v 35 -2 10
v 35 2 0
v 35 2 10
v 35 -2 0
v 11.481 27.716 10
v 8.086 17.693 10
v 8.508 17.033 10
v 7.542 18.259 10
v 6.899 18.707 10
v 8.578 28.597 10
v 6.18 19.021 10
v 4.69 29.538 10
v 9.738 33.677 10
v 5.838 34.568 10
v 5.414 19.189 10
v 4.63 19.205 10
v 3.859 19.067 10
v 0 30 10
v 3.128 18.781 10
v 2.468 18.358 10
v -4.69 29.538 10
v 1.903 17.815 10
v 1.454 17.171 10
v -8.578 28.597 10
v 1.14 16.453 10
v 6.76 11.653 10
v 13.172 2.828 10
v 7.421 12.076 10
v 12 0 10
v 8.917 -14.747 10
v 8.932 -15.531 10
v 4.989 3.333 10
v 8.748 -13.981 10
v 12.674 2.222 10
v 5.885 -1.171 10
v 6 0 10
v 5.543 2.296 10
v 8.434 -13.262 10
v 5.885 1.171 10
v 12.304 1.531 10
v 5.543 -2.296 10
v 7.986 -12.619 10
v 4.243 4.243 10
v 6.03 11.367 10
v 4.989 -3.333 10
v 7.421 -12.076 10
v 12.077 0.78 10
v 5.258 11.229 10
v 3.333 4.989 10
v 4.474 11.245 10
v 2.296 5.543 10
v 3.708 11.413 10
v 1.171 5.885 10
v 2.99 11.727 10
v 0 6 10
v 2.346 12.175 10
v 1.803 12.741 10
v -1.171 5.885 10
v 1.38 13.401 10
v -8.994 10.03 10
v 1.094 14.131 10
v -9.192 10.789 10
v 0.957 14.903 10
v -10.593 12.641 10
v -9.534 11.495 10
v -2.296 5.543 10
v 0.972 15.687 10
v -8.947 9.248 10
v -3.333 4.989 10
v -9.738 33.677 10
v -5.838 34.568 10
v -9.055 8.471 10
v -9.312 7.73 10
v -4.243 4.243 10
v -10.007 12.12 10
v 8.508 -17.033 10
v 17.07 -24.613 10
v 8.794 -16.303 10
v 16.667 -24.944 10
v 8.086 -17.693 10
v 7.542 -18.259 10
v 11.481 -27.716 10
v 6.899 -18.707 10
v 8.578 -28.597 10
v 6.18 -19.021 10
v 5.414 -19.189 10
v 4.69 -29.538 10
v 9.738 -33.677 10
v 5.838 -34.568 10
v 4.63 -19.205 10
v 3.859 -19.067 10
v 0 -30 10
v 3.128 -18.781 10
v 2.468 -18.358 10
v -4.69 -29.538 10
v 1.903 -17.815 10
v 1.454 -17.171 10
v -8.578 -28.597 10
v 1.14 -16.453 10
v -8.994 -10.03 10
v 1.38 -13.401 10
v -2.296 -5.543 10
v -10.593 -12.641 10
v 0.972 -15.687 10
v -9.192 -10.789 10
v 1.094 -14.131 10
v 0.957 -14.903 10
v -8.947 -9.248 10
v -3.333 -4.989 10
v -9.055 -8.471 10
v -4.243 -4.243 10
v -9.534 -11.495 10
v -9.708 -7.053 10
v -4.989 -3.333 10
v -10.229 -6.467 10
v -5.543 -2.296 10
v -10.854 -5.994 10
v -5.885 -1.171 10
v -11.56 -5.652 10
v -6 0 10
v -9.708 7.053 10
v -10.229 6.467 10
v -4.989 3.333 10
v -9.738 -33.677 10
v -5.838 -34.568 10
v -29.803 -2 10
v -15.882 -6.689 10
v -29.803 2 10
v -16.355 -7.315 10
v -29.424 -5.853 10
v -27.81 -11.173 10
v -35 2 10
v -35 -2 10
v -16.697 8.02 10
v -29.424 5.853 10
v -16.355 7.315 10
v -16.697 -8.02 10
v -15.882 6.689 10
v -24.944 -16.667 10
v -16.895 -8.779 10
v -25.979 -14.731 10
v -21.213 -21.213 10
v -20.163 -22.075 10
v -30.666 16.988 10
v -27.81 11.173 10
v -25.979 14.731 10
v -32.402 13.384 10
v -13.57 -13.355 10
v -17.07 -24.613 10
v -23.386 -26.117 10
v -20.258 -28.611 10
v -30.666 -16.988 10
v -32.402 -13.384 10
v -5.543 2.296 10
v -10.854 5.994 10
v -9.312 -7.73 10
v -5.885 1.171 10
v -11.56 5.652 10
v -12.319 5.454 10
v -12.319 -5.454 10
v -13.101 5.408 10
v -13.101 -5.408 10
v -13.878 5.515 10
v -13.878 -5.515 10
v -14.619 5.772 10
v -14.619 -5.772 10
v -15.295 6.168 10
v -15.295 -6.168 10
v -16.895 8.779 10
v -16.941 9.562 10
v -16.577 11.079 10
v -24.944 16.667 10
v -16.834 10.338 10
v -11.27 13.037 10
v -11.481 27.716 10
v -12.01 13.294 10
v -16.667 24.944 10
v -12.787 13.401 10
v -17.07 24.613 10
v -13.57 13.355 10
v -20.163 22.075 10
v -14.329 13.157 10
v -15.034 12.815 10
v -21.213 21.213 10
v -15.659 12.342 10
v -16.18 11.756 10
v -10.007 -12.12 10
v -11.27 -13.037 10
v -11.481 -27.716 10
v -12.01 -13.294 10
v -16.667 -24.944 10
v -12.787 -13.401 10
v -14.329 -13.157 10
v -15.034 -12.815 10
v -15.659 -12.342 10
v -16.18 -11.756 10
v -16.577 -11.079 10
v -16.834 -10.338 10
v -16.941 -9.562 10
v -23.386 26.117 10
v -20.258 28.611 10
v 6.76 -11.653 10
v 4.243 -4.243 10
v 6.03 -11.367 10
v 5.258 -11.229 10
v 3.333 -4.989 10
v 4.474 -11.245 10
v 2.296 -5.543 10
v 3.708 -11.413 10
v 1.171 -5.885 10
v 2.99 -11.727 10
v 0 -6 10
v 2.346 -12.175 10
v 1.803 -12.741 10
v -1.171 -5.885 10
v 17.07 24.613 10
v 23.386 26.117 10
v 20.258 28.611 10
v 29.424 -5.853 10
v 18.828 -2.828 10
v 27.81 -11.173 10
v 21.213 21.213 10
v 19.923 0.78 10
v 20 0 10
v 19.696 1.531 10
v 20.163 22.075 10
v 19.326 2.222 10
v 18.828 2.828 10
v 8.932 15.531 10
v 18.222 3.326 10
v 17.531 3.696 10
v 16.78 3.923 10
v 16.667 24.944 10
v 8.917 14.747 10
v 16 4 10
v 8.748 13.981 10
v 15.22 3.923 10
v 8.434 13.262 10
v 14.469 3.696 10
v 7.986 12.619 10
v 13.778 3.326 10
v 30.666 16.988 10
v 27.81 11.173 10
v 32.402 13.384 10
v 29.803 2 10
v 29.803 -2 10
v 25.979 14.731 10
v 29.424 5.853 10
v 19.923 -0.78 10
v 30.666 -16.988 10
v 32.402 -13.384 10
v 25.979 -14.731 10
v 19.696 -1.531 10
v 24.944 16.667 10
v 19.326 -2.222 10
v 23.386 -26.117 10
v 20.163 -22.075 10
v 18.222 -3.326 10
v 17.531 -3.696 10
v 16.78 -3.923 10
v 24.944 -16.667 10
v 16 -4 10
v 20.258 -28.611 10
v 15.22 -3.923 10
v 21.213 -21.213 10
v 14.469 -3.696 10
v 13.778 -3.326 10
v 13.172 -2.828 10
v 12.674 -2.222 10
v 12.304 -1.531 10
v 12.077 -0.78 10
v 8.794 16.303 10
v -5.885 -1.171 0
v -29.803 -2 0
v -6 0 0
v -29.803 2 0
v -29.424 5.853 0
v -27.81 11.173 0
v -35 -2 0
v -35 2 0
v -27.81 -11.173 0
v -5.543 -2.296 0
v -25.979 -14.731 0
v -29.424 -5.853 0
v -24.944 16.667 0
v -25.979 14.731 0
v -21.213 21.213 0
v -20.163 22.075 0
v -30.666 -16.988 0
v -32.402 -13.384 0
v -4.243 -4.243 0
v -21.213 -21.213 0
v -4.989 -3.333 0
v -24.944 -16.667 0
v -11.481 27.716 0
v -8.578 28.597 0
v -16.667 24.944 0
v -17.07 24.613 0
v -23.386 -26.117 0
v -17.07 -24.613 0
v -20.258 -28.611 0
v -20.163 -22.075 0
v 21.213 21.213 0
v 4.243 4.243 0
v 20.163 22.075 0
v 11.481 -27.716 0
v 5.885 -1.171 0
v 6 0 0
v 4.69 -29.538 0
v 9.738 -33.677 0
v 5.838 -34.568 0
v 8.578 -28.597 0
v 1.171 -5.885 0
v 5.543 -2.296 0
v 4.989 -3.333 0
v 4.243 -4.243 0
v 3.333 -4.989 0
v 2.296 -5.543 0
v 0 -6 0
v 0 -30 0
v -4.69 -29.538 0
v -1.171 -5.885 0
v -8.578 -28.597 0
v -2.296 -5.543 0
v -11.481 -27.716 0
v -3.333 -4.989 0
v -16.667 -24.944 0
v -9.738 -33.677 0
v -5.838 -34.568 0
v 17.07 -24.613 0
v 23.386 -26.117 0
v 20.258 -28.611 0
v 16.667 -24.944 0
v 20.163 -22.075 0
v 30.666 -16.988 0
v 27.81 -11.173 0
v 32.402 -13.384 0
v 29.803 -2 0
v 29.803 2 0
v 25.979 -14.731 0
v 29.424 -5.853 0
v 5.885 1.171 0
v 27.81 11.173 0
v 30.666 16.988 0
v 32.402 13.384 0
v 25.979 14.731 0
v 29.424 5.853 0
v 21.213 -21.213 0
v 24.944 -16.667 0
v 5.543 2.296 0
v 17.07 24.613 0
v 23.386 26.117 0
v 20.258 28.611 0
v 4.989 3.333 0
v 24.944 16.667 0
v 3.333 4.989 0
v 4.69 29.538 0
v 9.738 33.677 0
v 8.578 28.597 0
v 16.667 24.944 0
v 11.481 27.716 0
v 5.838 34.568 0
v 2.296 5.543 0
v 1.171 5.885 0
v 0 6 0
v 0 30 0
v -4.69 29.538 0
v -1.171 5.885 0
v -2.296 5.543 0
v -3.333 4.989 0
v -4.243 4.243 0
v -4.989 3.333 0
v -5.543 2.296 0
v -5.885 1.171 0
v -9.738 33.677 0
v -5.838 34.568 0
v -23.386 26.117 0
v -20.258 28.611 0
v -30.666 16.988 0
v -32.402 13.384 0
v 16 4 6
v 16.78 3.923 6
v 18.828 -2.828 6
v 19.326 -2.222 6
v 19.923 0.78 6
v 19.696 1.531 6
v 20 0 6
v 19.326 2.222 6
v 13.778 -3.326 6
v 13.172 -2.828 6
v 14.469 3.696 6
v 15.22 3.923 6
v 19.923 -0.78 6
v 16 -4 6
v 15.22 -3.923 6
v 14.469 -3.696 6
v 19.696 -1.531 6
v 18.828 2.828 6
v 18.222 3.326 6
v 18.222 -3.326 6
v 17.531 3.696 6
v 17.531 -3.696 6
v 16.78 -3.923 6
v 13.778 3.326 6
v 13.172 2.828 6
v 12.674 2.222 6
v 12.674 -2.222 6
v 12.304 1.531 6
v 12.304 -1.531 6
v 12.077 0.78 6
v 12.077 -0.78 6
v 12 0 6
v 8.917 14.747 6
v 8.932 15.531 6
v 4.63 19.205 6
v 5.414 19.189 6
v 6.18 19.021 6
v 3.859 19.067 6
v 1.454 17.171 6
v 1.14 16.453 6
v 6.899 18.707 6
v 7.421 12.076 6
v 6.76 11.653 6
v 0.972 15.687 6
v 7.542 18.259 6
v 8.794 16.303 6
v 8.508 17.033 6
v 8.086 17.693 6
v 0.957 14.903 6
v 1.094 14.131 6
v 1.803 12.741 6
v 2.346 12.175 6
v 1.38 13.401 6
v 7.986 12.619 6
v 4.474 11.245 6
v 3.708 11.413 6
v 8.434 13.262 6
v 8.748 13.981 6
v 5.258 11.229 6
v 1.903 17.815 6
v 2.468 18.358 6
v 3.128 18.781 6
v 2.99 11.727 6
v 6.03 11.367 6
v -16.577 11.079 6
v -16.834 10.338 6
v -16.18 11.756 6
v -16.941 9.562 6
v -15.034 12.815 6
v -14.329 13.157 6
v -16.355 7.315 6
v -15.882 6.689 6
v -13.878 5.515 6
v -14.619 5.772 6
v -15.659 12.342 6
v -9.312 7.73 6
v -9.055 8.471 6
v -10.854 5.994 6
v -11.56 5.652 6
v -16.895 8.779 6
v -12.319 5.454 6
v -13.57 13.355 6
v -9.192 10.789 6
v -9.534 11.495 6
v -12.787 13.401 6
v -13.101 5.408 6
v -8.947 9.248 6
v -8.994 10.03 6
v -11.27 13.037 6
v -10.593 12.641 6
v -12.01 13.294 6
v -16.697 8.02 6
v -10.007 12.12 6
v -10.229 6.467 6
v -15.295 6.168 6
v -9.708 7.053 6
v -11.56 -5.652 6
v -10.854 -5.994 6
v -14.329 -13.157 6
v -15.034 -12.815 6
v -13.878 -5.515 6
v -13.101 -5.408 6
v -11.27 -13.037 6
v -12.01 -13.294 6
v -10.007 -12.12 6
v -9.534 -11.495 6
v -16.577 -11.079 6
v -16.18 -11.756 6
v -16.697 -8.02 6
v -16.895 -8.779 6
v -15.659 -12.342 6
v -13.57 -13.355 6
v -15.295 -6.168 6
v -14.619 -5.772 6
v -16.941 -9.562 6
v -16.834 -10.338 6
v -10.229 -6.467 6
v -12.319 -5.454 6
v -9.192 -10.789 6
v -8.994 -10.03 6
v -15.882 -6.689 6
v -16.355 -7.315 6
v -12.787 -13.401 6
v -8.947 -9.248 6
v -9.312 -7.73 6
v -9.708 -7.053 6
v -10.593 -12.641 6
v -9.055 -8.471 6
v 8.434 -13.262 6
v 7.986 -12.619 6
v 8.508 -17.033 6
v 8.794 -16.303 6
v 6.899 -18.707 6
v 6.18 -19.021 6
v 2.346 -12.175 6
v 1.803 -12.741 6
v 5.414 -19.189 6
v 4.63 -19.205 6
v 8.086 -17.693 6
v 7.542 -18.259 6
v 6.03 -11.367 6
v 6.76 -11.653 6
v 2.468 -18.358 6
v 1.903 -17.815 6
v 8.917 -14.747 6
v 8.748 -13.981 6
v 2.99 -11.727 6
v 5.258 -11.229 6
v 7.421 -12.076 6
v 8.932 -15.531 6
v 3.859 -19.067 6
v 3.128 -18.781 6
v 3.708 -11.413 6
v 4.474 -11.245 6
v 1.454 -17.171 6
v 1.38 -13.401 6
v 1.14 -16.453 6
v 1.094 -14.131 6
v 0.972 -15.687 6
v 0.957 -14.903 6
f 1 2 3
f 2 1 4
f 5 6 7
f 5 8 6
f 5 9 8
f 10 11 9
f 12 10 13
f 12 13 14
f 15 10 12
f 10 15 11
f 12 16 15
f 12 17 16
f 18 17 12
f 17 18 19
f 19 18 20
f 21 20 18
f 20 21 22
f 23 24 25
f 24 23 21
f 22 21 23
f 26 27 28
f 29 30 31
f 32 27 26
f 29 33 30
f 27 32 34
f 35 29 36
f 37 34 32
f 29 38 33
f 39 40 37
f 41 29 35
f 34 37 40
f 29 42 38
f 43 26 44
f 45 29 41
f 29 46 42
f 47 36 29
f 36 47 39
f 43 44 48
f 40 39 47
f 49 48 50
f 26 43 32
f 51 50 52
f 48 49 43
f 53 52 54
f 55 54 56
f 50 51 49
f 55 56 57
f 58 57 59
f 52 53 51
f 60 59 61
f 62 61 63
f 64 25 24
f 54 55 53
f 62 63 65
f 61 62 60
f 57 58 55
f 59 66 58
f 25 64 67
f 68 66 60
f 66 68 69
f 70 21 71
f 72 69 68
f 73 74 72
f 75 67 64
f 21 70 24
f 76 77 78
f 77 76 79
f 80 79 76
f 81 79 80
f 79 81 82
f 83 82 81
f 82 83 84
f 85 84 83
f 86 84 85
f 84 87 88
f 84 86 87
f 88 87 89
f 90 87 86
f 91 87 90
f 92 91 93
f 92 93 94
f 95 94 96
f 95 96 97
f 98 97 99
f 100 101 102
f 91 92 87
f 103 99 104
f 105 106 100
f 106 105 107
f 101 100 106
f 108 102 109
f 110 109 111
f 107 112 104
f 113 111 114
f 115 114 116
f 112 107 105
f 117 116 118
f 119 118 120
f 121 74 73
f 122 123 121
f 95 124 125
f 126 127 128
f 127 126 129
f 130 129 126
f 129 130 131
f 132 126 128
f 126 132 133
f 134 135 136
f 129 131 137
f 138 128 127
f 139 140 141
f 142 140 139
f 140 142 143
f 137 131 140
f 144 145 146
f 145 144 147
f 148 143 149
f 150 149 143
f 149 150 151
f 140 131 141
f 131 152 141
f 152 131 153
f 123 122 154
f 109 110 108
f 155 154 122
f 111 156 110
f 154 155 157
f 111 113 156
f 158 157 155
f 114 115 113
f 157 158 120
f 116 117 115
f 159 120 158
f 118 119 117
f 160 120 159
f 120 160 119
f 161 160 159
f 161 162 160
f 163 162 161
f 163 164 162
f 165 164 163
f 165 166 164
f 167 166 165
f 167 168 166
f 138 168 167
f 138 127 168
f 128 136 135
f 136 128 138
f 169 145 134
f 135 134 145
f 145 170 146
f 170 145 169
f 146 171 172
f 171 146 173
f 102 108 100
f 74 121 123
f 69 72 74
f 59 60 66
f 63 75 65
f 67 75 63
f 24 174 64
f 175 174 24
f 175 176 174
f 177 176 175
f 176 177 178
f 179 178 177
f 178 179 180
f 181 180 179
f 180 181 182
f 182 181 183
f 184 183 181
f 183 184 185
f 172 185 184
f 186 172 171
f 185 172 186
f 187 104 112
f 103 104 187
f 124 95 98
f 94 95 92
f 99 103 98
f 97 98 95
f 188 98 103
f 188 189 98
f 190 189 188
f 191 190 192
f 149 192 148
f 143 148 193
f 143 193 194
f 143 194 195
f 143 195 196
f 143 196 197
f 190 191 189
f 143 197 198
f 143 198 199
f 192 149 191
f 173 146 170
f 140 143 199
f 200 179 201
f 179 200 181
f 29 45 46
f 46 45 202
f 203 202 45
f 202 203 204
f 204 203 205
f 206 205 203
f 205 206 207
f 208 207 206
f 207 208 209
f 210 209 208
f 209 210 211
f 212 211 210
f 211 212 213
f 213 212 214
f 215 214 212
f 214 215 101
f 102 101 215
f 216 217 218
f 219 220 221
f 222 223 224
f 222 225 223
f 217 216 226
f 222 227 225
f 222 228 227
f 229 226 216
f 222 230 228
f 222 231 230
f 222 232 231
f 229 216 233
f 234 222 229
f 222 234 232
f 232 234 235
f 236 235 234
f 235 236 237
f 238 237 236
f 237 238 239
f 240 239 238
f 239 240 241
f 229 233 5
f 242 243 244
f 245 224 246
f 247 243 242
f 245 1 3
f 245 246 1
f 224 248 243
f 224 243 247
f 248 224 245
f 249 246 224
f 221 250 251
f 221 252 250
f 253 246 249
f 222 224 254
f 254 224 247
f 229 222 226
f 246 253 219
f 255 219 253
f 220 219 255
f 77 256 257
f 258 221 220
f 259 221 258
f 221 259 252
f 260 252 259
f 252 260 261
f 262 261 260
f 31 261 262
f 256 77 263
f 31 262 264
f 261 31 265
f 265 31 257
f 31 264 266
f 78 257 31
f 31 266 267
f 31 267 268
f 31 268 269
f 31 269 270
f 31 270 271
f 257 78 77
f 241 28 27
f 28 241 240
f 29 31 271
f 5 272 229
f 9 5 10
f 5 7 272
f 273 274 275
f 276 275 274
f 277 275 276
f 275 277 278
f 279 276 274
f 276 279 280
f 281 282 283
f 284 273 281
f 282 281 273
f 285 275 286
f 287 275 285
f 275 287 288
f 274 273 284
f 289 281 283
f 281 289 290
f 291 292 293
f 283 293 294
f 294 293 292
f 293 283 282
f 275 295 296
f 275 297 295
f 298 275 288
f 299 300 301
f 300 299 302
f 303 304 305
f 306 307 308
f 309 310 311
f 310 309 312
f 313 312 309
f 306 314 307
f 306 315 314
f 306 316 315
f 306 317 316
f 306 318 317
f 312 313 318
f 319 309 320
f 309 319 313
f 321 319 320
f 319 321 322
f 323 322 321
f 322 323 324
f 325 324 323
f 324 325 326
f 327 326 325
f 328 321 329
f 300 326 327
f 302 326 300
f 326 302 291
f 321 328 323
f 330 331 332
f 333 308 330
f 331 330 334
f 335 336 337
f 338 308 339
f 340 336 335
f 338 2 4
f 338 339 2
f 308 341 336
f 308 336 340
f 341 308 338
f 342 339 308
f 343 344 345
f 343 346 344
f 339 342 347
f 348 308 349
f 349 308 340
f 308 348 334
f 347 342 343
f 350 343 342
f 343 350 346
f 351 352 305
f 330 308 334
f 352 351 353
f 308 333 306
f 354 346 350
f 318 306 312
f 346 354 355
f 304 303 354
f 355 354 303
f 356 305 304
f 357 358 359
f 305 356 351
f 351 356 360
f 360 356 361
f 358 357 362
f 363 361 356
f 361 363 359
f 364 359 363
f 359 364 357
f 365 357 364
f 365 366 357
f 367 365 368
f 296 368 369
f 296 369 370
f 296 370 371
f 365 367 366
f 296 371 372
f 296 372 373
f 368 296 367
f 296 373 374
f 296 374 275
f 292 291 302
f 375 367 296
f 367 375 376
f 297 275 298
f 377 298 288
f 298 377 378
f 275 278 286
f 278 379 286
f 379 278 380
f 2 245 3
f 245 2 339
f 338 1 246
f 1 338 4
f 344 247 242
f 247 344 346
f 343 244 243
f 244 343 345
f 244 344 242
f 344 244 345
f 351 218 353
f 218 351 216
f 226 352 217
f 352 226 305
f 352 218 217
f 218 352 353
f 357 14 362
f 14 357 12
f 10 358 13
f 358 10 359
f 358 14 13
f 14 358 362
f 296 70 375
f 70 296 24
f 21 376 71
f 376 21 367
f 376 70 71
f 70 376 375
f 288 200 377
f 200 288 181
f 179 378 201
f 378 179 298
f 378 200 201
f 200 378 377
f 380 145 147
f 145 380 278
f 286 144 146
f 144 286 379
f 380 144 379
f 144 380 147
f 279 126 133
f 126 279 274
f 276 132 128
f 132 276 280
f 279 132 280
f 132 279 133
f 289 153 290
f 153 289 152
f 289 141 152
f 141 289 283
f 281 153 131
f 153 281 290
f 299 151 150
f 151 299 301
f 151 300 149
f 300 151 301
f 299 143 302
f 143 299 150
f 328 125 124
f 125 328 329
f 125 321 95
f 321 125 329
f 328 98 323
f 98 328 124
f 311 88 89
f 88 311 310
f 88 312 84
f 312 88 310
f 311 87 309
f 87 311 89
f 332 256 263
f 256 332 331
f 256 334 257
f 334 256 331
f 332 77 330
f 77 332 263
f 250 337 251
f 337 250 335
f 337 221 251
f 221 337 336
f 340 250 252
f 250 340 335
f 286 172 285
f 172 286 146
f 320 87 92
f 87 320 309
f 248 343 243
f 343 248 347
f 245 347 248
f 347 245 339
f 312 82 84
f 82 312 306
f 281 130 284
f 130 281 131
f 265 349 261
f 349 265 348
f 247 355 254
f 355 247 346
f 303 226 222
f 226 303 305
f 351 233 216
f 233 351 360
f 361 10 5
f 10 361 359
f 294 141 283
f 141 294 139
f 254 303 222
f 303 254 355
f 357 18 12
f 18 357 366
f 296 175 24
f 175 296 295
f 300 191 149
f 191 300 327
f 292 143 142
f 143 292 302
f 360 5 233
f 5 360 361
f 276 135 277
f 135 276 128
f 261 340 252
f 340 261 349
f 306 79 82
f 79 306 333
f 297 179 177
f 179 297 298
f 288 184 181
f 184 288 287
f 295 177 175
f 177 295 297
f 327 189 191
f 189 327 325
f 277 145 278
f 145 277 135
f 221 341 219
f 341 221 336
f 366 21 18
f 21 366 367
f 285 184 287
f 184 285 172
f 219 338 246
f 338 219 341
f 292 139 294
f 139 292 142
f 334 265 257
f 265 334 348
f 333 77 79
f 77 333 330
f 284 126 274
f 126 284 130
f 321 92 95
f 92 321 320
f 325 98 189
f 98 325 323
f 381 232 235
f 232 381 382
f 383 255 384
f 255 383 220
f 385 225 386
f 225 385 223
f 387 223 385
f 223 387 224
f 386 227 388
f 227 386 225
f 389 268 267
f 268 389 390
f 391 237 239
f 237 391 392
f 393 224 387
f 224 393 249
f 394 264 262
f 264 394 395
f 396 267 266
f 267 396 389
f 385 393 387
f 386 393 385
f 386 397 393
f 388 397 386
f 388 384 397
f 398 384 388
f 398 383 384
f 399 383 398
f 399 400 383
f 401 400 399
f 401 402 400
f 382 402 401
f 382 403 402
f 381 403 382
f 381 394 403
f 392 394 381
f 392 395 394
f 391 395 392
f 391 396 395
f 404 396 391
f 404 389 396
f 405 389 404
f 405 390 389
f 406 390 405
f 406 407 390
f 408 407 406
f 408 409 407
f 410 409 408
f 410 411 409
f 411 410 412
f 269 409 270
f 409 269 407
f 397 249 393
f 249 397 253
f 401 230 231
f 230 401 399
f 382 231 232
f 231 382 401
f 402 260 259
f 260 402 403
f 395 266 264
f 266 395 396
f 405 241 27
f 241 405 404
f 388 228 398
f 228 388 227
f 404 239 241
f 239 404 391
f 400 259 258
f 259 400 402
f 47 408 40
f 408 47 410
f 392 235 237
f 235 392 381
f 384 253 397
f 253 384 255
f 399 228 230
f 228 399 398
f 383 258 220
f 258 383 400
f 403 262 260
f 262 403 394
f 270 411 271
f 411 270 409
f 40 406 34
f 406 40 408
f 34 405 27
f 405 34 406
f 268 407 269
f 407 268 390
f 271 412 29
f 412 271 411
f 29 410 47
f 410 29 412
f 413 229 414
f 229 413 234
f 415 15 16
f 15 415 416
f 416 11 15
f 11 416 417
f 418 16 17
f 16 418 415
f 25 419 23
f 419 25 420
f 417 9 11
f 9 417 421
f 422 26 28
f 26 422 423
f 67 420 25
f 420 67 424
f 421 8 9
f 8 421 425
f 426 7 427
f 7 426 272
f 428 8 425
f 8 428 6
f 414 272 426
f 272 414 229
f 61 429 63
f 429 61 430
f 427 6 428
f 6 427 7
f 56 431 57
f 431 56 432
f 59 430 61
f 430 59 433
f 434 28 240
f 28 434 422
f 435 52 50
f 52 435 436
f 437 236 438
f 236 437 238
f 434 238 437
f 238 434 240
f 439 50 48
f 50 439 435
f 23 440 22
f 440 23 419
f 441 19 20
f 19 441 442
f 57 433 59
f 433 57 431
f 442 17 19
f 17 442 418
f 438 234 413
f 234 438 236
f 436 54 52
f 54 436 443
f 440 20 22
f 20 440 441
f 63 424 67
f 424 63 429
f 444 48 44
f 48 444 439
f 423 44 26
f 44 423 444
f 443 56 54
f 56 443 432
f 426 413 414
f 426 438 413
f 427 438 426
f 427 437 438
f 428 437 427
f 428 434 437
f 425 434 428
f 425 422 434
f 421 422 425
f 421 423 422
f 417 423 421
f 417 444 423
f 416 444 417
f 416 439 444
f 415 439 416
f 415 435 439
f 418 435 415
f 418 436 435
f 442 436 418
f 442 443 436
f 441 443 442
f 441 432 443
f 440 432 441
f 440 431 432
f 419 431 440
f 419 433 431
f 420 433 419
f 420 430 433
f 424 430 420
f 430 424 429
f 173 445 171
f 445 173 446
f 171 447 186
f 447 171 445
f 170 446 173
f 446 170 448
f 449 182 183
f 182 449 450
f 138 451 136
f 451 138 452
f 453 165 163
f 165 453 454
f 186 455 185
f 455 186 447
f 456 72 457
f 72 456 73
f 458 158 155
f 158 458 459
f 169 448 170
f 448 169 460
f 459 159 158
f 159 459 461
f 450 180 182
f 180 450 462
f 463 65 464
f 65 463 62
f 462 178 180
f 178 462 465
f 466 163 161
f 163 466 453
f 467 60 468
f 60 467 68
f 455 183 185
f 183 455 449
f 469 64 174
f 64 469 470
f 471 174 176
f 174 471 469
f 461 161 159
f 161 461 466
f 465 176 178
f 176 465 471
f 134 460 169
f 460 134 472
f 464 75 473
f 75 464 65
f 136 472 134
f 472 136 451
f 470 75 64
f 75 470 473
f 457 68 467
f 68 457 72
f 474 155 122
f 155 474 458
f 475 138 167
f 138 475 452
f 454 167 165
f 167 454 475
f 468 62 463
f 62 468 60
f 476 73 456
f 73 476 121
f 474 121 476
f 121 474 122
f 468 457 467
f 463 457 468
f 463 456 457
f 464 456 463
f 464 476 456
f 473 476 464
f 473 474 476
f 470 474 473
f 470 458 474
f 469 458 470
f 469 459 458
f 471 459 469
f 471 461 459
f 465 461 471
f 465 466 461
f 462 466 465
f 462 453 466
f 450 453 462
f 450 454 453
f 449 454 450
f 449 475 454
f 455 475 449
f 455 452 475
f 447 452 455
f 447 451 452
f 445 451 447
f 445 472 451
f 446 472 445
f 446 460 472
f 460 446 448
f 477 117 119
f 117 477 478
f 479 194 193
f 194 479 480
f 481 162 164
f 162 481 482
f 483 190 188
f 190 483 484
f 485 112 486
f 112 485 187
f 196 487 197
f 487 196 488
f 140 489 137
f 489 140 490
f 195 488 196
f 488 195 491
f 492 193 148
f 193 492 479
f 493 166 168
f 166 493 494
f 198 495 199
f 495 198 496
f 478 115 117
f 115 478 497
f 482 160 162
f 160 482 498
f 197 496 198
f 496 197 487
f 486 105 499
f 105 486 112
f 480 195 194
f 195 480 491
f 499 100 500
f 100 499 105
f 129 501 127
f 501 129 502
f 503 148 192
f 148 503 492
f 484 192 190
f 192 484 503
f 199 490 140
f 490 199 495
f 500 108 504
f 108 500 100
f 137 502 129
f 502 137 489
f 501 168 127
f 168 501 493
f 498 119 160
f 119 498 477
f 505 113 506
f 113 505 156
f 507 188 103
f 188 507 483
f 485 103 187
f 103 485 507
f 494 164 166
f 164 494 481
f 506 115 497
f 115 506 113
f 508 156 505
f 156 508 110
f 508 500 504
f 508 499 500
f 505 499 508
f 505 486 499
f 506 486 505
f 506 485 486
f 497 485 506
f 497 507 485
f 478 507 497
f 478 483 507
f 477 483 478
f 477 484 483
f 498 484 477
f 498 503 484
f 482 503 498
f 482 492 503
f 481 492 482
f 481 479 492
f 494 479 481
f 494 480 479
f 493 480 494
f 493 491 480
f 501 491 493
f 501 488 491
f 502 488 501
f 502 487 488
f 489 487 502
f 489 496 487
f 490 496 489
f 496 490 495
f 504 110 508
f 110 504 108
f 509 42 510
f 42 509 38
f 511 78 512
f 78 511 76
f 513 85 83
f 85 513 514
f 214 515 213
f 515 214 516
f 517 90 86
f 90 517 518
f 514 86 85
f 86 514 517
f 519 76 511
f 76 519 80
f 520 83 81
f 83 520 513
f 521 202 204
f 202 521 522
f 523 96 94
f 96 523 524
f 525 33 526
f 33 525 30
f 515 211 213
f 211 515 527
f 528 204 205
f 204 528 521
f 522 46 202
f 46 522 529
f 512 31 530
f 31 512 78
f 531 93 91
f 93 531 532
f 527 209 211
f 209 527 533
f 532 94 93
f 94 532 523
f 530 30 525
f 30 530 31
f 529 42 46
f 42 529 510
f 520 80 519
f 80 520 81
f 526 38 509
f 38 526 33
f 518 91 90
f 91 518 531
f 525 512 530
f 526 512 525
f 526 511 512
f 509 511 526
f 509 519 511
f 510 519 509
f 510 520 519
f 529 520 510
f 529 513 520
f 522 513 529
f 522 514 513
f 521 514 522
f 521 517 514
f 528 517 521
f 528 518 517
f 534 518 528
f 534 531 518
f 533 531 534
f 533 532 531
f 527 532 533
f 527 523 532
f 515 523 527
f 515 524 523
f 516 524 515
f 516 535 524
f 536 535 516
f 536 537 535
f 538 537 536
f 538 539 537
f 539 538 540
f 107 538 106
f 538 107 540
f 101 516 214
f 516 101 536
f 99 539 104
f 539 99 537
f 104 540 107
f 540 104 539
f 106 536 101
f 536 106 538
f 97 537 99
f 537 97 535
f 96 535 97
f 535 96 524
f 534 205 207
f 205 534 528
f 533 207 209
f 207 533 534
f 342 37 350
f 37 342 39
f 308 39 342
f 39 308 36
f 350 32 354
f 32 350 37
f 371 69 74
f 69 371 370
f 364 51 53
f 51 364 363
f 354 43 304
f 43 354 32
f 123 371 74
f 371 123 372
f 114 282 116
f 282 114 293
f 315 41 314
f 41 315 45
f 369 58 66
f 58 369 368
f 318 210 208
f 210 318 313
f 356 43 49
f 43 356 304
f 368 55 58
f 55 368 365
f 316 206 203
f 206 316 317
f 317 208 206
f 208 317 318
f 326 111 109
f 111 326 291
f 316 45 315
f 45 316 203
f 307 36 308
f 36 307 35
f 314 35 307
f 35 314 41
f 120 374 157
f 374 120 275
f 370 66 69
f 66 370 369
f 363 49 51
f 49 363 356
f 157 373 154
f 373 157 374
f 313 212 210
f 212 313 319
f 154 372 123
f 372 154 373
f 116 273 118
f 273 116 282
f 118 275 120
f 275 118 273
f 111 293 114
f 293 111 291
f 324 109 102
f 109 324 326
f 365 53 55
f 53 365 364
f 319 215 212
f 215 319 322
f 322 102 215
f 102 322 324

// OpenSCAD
$fn = 32;

// ----------------------------------------------------------------------
// Spur blank: lightened gear blank
// ----------------------------------------------------------------------

// --- parameters (mm) ---
disc_r = 30;              // blank root radius
disc_t = 10;              // blank thickness
n_teeth = 14;             // stub tooth count
tooth_w = 4;              // tooth width at the root
tooth_h = 5;              // tooth height above the root
bore_r = 6;               // central bore radius
ring_r = 16;              // lightening pocket ring radius
pocket_r = 4;             // lightening pocket radius

out_r = disc_r + tooth_h;  // tip radius
bbox_x = 70.0;  // measured width over the teeth
bbox_y = 69.14;  // measured depth over the teeth

difference() {
union() {
  cylinder(r = disc_r, h = disc_t);
  for (i = [0 : n_teeth - 1])
    rotate([0, 0, i * 360 / n_teeth])
      translate([disc_r - 1, -tooth_w / 2, 0])
        cube([tooth_h + 1, tooth_w, disc_t]);
}
  translate([0, 0, -1]) cylinder(r = bore_r, h = disc_t + 2);
  for (i = [0 : 5])
    rotate([0, 0, i * 72])
      translate([ring_r, 0, disc_t - 4])
        cylinder(r = pocket_r, h = 5);
}
